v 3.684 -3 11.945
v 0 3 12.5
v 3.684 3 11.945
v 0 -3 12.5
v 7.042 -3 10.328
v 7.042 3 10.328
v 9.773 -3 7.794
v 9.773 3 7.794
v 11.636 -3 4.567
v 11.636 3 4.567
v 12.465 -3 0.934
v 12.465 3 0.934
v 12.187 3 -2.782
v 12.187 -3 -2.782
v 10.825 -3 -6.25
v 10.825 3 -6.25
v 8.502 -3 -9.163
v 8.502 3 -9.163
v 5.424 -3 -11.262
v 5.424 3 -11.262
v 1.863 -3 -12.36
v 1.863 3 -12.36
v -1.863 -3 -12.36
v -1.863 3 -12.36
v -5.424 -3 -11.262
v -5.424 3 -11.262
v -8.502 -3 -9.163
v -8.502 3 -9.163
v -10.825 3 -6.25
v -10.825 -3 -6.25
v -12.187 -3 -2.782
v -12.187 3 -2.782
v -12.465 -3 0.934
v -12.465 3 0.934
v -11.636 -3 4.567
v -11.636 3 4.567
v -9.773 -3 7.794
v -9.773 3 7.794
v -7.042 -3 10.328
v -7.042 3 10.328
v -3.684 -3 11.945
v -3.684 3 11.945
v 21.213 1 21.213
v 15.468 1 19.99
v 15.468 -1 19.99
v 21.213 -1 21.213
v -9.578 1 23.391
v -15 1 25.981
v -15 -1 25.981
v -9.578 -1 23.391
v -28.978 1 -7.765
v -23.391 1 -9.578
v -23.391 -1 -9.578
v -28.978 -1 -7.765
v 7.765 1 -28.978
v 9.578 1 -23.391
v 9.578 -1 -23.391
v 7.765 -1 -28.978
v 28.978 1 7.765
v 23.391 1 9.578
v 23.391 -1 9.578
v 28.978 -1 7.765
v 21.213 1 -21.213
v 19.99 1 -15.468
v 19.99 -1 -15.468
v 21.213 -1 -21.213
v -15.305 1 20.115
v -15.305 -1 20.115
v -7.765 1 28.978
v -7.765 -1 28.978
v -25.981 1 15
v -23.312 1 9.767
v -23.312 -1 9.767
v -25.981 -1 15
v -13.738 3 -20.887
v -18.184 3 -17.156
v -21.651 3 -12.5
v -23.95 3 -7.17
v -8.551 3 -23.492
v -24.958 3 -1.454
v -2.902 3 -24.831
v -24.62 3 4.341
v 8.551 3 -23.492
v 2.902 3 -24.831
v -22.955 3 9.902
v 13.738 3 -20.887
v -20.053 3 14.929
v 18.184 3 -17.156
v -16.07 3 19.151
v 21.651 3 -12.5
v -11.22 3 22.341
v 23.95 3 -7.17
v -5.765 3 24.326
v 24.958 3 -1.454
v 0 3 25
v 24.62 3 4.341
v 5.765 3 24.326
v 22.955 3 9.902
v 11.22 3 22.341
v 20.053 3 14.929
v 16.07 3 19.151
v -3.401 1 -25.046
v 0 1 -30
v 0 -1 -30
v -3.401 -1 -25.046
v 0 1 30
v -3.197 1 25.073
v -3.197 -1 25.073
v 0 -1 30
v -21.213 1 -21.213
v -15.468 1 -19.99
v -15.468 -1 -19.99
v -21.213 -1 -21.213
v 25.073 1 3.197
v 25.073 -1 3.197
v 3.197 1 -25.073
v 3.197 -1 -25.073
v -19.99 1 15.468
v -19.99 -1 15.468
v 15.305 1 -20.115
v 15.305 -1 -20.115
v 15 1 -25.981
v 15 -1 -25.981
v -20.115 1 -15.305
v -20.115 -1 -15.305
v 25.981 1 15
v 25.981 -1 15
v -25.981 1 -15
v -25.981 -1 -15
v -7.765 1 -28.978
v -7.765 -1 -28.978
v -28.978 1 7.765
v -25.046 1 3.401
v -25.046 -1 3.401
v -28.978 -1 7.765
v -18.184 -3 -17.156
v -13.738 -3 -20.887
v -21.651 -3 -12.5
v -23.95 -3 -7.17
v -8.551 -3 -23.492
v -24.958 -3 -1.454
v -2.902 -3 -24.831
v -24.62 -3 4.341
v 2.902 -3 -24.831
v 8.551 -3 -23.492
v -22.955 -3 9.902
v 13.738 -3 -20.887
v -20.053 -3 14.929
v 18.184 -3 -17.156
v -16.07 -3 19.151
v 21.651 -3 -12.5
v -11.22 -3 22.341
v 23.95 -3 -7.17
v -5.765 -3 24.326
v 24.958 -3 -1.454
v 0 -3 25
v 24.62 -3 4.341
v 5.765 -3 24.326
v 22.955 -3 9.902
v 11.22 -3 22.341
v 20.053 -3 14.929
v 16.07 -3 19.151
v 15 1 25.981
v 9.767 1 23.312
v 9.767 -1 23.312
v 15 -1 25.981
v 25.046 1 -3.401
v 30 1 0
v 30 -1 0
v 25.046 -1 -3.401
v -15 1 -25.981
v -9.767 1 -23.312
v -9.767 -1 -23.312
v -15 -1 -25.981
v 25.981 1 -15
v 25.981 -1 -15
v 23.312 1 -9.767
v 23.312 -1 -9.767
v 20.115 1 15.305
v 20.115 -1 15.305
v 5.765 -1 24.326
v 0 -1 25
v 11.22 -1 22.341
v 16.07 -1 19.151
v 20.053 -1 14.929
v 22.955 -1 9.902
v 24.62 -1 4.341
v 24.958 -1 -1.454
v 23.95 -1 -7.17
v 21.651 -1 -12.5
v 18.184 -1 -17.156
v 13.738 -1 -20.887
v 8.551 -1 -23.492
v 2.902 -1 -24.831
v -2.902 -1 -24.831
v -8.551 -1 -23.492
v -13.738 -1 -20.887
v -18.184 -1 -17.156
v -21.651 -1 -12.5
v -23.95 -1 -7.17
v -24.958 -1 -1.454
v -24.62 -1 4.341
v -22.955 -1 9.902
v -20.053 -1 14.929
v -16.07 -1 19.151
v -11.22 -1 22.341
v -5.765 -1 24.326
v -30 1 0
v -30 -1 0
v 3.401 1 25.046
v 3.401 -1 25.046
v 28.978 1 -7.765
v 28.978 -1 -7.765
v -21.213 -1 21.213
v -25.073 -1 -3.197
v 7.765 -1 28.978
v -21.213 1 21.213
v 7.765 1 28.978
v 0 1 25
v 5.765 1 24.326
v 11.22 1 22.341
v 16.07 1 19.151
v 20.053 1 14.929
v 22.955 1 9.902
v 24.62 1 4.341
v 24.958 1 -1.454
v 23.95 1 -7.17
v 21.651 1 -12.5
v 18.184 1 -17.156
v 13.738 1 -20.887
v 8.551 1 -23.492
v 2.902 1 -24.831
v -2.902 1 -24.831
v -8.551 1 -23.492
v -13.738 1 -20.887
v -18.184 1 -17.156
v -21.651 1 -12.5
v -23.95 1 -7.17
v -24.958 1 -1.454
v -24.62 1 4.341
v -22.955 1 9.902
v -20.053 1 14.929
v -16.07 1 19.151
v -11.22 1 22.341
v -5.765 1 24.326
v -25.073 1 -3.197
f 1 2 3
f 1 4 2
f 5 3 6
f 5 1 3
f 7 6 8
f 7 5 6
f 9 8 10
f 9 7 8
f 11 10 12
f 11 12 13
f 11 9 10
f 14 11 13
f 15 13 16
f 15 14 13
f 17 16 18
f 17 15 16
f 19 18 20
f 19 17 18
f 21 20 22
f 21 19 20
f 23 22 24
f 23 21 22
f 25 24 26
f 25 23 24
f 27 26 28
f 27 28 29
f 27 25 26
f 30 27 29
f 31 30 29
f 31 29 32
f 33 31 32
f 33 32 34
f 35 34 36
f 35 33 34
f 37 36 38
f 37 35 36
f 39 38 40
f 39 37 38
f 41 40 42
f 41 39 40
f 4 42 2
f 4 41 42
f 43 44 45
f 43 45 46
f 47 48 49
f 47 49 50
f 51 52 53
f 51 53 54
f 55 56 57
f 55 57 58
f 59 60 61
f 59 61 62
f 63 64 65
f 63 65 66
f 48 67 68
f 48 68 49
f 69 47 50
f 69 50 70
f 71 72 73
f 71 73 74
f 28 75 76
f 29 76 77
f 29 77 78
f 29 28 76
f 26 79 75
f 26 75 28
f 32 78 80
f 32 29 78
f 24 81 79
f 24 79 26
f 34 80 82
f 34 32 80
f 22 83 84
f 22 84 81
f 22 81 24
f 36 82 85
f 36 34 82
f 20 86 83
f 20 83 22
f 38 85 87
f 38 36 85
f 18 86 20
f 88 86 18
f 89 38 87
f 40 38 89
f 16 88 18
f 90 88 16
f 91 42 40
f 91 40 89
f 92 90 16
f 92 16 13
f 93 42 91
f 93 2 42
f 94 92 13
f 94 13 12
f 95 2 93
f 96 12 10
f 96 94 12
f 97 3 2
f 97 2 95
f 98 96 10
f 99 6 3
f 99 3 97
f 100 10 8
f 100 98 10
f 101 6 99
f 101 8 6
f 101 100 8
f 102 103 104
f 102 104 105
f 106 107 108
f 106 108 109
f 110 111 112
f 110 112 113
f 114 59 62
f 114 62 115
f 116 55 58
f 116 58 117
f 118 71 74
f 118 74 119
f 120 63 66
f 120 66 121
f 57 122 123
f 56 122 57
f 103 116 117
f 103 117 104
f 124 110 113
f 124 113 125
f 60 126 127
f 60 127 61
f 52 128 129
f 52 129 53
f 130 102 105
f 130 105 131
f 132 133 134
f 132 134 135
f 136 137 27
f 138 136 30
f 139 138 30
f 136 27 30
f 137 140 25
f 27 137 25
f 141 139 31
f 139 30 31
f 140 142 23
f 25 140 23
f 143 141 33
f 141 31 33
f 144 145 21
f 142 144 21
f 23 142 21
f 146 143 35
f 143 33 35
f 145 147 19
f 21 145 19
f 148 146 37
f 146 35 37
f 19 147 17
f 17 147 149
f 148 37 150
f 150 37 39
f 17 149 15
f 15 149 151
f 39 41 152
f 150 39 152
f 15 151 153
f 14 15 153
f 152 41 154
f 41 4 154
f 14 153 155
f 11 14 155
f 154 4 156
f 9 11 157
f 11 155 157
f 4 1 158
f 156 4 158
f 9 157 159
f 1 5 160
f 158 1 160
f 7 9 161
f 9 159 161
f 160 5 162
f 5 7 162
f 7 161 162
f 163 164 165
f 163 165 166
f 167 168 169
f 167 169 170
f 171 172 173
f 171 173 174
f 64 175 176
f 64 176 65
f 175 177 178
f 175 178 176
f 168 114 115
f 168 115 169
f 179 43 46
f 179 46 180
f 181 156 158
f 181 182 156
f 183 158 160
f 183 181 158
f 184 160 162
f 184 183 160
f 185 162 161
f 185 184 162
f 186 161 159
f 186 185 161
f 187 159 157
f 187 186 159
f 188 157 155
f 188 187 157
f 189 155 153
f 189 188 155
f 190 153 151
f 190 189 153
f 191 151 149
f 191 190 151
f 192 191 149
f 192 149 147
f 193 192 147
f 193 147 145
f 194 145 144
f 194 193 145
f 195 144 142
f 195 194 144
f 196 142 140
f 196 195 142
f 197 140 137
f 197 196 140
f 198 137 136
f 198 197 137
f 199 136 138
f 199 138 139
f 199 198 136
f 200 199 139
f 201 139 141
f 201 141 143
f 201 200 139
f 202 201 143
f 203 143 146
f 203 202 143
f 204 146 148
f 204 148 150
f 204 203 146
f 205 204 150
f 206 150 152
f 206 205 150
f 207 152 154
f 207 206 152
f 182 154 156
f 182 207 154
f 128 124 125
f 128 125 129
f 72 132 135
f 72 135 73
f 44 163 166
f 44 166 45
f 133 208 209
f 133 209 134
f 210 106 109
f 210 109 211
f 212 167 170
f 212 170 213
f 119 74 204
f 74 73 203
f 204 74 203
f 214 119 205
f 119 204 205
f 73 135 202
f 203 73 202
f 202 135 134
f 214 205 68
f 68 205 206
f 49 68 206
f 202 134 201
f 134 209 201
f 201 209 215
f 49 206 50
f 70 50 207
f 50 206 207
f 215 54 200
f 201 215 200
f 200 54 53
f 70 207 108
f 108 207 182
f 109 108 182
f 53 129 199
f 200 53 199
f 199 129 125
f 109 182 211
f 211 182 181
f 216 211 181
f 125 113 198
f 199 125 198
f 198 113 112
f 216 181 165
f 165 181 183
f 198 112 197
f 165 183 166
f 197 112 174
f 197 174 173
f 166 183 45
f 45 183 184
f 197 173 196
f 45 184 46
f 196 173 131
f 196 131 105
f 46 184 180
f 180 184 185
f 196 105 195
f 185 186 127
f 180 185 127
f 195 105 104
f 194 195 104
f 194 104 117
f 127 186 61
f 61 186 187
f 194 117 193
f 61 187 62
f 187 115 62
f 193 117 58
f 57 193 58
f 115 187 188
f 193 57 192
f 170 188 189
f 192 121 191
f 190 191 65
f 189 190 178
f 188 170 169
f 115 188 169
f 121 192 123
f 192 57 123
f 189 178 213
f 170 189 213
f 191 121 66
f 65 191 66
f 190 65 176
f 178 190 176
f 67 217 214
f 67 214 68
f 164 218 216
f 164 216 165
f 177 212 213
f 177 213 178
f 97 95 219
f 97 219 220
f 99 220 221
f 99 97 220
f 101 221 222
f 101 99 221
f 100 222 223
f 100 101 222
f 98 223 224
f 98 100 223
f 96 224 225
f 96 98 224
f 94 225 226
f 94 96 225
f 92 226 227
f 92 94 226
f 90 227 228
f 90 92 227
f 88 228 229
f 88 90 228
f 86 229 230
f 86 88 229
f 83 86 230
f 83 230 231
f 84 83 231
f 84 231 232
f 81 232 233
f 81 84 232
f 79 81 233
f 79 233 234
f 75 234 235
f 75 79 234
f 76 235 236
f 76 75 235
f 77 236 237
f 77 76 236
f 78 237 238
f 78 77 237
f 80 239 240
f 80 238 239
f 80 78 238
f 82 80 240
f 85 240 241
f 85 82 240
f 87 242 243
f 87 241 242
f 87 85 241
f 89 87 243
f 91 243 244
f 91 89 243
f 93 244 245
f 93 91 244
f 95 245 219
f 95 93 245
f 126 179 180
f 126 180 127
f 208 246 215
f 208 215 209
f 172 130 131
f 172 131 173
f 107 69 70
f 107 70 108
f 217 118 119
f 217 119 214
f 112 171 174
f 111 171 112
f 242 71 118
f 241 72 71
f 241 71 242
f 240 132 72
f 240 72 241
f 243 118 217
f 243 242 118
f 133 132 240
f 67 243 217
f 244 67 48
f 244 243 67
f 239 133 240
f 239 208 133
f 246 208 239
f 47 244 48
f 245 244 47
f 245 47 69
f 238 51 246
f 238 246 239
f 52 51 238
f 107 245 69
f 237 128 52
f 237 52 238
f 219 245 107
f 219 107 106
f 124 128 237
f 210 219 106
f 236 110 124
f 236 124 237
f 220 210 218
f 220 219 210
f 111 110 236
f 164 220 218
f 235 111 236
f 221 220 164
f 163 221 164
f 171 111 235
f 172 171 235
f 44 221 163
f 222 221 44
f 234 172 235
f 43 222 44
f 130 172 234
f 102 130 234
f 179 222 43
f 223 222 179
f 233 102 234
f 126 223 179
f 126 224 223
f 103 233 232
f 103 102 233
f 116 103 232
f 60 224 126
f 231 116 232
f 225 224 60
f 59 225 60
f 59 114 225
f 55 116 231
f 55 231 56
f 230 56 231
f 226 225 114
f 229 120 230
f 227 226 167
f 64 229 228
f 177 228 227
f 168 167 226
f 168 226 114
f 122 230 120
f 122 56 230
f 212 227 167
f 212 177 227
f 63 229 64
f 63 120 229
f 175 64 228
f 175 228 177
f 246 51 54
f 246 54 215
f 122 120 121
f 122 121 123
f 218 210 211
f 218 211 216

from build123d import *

# Parameters (mm, degrees)
SKETCH1_R           = 25
SKETCH1_R_2         = 12.5
BOSS_EXTRUDE2_DEPTH = 3
BOSS_EXTRUDE3_DEPTH = 1
CIRPATTERN1_COUNT   = 24


with BuildPart() as part:
    # Sketch1 → Boss-Extrude2 (new, symmetric)
    with BuildSketch(Plane(origin=(0, 0, 0), x_dir=(1, 0, 0), z_dir=(0, 1, 0))):
        with Locations(Location((0, 0, 0), (0, 0, 270))):
            Circle(SKETCH1_R)
        with Locations(Location((0, 0, 0), (0, 0, 270))):
            Circle(SKETCH1_R_2, mode=Mode.SUBTRACT)
    extrude(amount=BOSS_EXTRUDE2_DEPTH, both=True)

    # Sketch4 → Boss-Extrude3 (add, symmetric)
    with BuildSketch(Plane(origin=(0, 0, 0), x_dir=(1, 0, 0), z_dir=(0, 1, 0))):
        Polygon((0, 30), (-3.612358793, 24.73764063), (0, 25), (3.394844565, 24.768428097), align=None)
    boss_extrude3 = extrude(amount=BOSS_EXTRUDE3_DEPTH, both=True)

    # CirPattern1: Boss-Extrude3 ×24 about axis
    cirpattern1_axis = Axis((0, 0, 0), (0, 1, 0))
    for i in range(1, CIRPATTERN1_COUNT):
        add(boss_extrude3.rotate(cirpattern1_axis, i * 360 / CIRPATTERN1_COUNT))


solid = part.part
